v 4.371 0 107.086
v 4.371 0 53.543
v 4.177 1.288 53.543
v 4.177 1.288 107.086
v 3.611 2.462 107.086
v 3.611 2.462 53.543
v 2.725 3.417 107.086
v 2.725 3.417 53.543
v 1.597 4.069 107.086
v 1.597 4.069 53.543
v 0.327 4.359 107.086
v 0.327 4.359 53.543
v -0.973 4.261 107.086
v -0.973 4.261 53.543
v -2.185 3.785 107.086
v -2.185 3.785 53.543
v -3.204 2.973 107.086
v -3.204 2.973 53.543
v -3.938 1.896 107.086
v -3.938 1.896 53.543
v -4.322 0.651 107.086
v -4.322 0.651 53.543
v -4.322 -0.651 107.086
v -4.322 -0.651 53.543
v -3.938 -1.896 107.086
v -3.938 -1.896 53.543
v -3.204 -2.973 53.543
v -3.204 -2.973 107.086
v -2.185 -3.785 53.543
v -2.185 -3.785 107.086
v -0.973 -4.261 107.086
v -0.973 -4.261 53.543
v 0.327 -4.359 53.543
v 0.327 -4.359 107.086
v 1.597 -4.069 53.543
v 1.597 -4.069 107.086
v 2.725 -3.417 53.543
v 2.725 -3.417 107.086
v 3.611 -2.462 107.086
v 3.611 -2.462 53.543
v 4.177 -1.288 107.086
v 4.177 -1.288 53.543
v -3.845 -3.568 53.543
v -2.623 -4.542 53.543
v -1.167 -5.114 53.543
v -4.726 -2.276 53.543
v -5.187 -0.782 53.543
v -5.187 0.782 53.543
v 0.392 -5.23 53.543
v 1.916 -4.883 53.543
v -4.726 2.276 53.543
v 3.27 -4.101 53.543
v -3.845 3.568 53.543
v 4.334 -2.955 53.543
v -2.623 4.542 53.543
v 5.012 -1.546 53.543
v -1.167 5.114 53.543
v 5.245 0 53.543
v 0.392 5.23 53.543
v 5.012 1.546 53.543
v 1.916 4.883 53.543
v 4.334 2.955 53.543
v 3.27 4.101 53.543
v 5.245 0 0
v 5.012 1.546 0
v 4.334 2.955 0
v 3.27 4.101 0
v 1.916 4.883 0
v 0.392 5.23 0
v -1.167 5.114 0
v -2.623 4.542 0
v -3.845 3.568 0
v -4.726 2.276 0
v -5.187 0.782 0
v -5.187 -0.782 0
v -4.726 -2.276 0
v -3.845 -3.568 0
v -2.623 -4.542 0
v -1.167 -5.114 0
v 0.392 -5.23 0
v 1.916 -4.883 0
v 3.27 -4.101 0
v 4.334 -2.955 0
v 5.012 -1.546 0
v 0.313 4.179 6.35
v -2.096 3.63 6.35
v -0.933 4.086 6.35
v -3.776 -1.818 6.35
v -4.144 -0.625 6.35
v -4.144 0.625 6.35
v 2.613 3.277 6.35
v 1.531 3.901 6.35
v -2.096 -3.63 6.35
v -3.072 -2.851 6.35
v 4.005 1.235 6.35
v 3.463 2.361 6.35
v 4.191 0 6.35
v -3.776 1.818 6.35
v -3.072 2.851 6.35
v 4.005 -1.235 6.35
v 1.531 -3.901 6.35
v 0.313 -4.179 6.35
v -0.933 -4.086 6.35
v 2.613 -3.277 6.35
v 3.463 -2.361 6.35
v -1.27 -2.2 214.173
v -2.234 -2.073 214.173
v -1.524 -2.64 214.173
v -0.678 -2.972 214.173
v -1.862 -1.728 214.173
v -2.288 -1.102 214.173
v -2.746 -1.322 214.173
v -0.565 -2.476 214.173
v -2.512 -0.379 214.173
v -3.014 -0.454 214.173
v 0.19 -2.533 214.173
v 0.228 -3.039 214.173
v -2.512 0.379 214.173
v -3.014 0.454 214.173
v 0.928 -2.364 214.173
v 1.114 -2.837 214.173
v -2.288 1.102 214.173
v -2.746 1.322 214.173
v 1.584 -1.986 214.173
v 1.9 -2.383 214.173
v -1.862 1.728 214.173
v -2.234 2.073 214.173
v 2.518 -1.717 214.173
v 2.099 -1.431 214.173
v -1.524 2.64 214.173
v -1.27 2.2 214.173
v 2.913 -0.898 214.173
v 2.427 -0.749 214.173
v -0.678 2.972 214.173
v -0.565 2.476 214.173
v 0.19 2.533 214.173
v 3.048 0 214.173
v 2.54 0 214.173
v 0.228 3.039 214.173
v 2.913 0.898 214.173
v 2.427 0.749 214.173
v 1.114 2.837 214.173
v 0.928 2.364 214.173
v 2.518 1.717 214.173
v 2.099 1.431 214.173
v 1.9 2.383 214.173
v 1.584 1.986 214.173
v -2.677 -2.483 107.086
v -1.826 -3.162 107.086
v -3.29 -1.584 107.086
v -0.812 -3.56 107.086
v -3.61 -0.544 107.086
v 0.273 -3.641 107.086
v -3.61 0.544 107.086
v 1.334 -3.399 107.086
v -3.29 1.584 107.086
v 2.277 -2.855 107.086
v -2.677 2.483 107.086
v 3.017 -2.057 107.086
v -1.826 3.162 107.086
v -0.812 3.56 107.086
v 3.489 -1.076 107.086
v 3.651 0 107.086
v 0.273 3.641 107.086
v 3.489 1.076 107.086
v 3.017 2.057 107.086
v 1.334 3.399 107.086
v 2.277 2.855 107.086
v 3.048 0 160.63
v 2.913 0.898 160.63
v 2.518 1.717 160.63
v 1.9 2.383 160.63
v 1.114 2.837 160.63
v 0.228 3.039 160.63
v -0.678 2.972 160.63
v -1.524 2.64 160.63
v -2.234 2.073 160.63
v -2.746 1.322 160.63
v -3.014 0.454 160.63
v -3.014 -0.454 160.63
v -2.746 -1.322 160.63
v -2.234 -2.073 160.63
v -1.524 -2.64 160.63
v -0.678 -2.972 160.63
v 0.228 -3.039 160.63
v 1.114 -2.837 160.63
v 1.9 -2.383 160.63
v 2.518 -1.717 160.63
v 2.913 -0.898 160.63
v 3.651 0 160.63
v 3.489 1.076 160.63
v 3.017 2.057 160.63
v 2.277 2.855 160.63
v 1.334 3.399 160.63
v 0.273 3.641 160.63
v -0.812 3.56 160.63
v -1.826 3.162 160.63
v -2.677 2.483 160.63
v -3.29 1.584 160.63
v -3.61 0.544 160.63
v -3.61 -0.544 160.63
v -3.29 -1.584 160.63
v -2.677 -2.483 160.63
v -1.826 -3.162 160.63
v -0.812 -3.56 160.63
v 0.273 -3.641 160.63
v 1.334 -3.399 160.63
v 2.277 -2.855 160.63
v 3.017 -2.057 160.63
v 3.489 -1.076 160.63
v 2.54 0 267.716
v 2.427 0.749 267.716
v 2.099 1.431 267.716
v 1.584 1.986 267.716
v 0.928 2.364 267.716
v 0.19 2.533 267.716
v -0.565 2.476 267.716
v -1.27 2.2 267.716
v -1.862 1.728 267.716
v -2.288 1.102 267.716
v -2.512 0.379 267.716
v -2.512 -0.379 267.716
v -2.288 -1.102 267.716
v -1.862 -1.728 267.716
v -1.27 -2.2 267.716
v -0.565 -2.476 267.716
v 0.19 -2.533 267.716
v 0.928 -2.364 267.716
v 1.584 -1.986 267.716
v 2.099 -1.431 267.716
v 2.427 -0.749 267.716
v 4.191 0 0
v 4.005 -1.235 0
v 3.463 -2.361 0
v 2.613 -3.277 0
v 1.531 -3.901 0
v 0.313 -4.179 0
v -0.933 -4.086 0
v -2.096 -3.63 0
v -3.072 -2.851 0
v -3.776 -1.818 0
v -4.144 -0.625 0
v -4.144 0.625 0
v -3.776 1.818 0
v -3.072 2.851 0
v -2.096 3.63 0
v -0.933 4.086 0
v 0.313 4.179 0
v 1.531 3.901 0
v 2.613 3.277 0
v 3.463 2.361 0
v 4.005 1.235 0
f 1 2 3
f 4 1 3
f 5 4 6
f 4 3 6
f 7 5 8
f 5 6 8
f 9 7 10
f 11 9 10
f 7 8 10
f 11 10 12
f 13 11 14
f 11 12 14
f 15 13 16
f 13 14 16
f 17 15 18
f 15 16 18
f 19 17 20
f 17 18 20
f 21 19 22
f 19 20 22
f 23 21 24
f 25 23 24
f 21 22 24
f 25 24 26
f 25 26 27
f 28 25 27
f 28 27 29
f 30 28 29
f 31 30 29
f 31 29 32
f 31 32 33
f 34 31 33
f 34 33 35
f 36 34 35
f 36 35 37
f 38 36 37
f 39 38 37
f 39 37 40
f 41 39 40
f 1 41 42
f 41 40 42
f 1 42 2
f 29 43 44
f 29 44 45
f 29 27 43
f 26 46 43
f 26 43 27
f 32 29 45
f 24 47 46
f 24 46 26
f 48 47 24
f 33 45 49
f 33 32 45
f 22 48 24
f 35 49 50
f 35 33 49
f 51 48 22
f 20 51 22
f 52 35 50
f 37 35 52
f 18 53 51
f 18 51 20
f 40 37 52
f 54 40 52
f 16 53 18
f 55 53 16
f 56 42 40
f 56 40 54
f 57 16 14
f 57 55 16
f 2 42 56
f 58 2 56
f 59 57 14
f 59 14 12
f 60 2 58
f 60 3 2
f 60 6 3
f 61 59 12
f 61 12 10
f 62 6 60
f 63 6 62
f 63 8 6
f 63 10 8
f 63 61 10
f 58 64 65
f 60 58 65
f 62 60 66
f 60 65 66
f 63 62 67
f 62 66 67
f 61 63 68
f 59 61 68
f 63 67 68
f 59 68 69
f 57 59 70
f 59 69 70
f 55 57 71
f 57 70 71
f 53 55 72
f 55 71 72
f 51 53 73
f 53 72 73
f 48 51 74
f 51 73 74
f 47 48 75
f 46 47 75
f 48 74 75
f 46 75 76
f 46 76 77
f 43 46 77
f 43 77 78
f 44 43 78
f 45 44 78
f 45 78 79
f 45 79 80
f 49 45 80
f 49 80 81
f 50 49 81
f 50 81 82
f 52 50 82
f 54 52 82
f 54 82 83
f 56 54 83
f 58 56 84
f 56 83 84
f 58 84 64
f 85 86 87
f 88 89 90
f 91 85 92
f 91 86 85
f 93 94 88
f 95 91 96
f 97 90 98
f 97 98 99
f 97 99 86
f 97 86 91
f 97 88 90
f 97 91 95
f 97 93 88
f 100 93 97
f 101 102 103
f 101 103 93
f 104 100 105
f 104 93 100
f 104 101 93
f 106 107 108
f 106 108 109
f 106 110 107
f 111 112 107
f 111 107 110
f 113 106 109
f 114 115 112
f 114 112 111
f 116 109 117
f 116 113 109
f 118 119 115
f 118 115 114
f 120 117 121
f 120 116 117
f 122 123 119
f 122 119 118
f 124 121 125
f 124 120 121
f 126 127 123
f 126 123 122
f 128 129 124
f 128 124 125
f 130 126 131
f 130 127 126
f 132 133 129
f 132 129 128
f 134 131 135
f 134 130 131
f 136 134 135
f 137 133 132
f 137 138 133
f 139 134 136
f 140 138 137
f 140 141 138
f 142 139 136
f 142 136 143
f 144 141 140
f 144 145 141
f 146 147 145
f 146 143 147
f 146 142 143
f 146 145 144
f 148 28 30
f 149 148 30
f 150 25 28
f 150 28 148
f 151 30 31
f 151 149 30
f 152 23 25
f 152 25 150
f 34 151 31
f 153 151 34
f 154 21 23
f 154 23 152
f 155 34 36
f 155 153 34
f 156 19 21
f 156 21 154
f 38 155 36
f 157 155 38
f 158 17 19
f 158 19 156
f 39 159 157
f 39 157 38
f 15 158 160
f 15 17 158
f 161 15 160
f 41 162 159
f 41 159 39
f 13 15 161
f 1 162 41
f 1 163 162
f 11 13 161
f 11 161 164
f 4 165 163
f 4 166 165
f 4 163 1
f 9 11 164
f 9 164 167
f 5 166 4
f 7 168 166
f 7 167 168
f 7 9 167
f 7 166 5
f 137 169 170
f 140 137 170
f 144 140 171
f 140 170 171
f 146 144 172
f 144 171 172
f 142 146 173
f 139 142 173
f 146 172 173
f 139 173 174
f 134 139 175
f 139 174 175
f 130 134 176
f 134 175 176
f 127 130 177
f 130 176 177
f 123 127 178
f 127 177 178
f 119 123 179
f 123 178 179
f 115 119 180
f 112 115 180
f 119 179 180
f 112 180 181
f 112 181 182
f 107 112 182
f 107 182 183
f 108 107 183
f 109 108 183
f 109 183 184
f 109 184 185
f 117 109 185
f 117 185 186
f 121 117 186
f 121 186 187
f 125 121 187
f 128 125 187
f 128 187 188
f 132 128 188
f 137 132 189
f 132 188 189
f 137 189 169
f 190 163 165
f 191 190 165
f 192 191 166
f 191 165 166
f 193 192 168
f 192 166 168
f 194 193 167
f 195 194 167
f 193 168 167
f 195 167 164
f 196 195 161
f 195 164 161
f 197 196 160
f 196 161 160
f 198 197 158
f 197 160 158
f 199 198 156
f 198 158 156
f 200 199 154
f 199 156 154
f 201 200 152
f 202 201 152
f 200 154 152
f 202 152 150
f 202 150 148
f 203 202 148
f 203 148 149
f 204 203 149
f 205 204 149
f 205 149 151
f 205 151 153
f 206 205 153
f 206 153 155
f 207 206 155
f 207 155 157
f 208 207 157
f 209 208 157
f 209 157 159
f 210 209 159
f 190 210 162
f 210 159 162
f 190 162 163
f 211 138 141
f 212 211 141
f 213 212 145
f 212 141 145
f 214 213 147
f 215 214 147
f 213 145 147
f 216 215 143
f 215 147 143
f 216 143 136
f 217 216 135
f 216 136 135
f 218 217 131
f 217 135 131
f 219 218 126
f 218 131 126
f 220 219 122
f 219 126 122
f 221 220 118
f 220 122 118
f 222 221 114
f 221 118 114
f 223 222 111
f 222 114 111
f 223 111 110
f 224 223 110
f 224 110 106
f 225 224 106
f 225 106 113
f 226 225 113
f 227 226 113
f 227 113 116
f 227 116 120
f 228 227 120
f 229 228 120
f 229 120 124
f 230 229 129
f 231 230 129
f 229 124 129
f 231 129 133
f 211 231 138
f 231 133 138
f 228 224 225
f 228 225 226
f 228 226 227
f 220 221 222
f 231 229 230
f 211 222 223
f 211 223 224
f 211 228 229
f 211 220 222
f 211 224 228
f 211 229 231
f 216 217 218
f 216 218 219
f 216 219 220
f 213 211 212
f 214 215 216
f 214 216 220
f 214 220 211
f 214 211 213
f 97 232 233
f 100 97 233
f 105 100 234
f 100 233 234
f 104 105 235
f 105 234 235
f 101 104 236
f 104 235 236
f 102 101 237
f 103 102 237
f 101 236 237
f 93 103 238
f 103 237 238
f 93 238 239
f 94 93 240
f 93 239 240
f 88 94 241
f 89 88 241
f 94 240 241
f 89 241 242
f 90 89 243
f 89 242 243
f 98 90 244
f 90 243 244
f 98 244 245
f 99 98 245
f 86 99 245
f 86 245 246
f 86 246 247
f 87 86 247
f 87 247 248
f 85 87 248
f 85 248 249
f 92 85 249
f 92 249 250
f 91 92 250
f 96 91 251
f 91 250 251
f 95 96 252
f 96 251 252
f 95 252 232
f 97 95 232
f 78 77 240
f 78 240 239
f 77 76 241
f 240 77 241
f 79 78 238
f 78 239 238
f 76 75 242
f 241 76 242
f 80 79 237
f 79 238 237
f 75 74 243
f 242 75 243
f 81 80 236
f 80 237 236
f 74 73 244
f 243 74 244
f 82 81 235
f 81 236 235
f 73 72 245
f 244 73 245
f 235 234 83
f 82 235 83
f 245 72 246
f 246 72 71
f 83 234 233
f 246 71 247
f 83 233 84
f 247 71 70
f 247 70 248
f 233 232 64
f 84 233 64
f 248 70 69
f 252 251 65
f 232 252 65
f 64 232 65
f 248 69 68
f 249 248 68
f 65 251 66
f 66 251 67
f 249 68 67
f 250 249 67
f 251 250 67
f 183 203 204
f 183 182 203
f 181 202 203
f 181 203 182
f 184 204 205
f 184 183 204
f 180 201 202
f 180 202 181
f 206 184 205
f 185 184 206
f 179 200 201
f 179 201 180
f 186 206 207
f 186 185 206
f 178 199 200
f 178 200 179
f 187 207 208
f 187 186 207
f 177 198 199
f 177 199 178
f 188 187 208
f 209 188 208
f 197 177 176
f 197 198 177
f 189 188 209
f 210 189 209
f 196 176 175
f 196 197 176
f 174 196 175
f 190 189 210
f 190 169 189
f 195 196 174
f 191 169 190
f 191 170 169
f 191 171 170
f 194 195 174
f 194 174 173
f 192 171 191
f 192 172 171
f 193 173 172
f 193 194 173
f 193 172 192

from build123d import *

# Parameters (mm, degrees)
F0_R      = 5.2451
F1_DEPTH  = 53.5432
F2_R      = 4.191
F3_DEPTH  = 6.35
F4_R      = 4.370917
F5_DEPTH  = 53.5432
F6_R      = 3.65125
F7_DEPTH  = 53.5432
F8_R      = 3.048
F9_DEPTH  = 53.5432
F10_R     = 2.54
F11_DEPTH = 53.5432


with BuildPart() as f1:
    # F0 (on Top) → F1 (new body)
    with BuildSketch(Plane.XY):
        Circle(F0_R)
    extrude(amount=F1_DEPTH)

    # F2 (on face) → F3 (cut)
    with BuildSketch(Plane(origin=(0, 0, 0), x_dir=(1, 0, 0), z_dir=(0, 0, -1))):
        Circle(F2_R)
    extrude(amount=-F3_DEPTH, mode=Mode.SUBTRACT)

    # F4 (on face) → F5 (join)
    with BuildSketch(Plane.XY.offset(53.5432)):
        Circle(F4_R)
    extrude(amount=F5_DEPTH)

    # F6 (on face) → F7 (join)
    with BuildSketch(Plane.XY.offset(107.0864)):
        Circle(F6_R)
    extrude(amount=F7_DEPTH)

    # F8 (on face) → F9 (join)
    with BuildSketch(Plane.XY.offset(160.6296)):
        Circle(F8_R)
    extrude(amount=F9_DEPTH)

    # F10 (on face) → F11 (join)
    with BuildSketch(Plane.XY.offset(214.1728)):
        Circle(F10_R)
    extrude(amount=F11_DEPTH)


solid = f1.part
